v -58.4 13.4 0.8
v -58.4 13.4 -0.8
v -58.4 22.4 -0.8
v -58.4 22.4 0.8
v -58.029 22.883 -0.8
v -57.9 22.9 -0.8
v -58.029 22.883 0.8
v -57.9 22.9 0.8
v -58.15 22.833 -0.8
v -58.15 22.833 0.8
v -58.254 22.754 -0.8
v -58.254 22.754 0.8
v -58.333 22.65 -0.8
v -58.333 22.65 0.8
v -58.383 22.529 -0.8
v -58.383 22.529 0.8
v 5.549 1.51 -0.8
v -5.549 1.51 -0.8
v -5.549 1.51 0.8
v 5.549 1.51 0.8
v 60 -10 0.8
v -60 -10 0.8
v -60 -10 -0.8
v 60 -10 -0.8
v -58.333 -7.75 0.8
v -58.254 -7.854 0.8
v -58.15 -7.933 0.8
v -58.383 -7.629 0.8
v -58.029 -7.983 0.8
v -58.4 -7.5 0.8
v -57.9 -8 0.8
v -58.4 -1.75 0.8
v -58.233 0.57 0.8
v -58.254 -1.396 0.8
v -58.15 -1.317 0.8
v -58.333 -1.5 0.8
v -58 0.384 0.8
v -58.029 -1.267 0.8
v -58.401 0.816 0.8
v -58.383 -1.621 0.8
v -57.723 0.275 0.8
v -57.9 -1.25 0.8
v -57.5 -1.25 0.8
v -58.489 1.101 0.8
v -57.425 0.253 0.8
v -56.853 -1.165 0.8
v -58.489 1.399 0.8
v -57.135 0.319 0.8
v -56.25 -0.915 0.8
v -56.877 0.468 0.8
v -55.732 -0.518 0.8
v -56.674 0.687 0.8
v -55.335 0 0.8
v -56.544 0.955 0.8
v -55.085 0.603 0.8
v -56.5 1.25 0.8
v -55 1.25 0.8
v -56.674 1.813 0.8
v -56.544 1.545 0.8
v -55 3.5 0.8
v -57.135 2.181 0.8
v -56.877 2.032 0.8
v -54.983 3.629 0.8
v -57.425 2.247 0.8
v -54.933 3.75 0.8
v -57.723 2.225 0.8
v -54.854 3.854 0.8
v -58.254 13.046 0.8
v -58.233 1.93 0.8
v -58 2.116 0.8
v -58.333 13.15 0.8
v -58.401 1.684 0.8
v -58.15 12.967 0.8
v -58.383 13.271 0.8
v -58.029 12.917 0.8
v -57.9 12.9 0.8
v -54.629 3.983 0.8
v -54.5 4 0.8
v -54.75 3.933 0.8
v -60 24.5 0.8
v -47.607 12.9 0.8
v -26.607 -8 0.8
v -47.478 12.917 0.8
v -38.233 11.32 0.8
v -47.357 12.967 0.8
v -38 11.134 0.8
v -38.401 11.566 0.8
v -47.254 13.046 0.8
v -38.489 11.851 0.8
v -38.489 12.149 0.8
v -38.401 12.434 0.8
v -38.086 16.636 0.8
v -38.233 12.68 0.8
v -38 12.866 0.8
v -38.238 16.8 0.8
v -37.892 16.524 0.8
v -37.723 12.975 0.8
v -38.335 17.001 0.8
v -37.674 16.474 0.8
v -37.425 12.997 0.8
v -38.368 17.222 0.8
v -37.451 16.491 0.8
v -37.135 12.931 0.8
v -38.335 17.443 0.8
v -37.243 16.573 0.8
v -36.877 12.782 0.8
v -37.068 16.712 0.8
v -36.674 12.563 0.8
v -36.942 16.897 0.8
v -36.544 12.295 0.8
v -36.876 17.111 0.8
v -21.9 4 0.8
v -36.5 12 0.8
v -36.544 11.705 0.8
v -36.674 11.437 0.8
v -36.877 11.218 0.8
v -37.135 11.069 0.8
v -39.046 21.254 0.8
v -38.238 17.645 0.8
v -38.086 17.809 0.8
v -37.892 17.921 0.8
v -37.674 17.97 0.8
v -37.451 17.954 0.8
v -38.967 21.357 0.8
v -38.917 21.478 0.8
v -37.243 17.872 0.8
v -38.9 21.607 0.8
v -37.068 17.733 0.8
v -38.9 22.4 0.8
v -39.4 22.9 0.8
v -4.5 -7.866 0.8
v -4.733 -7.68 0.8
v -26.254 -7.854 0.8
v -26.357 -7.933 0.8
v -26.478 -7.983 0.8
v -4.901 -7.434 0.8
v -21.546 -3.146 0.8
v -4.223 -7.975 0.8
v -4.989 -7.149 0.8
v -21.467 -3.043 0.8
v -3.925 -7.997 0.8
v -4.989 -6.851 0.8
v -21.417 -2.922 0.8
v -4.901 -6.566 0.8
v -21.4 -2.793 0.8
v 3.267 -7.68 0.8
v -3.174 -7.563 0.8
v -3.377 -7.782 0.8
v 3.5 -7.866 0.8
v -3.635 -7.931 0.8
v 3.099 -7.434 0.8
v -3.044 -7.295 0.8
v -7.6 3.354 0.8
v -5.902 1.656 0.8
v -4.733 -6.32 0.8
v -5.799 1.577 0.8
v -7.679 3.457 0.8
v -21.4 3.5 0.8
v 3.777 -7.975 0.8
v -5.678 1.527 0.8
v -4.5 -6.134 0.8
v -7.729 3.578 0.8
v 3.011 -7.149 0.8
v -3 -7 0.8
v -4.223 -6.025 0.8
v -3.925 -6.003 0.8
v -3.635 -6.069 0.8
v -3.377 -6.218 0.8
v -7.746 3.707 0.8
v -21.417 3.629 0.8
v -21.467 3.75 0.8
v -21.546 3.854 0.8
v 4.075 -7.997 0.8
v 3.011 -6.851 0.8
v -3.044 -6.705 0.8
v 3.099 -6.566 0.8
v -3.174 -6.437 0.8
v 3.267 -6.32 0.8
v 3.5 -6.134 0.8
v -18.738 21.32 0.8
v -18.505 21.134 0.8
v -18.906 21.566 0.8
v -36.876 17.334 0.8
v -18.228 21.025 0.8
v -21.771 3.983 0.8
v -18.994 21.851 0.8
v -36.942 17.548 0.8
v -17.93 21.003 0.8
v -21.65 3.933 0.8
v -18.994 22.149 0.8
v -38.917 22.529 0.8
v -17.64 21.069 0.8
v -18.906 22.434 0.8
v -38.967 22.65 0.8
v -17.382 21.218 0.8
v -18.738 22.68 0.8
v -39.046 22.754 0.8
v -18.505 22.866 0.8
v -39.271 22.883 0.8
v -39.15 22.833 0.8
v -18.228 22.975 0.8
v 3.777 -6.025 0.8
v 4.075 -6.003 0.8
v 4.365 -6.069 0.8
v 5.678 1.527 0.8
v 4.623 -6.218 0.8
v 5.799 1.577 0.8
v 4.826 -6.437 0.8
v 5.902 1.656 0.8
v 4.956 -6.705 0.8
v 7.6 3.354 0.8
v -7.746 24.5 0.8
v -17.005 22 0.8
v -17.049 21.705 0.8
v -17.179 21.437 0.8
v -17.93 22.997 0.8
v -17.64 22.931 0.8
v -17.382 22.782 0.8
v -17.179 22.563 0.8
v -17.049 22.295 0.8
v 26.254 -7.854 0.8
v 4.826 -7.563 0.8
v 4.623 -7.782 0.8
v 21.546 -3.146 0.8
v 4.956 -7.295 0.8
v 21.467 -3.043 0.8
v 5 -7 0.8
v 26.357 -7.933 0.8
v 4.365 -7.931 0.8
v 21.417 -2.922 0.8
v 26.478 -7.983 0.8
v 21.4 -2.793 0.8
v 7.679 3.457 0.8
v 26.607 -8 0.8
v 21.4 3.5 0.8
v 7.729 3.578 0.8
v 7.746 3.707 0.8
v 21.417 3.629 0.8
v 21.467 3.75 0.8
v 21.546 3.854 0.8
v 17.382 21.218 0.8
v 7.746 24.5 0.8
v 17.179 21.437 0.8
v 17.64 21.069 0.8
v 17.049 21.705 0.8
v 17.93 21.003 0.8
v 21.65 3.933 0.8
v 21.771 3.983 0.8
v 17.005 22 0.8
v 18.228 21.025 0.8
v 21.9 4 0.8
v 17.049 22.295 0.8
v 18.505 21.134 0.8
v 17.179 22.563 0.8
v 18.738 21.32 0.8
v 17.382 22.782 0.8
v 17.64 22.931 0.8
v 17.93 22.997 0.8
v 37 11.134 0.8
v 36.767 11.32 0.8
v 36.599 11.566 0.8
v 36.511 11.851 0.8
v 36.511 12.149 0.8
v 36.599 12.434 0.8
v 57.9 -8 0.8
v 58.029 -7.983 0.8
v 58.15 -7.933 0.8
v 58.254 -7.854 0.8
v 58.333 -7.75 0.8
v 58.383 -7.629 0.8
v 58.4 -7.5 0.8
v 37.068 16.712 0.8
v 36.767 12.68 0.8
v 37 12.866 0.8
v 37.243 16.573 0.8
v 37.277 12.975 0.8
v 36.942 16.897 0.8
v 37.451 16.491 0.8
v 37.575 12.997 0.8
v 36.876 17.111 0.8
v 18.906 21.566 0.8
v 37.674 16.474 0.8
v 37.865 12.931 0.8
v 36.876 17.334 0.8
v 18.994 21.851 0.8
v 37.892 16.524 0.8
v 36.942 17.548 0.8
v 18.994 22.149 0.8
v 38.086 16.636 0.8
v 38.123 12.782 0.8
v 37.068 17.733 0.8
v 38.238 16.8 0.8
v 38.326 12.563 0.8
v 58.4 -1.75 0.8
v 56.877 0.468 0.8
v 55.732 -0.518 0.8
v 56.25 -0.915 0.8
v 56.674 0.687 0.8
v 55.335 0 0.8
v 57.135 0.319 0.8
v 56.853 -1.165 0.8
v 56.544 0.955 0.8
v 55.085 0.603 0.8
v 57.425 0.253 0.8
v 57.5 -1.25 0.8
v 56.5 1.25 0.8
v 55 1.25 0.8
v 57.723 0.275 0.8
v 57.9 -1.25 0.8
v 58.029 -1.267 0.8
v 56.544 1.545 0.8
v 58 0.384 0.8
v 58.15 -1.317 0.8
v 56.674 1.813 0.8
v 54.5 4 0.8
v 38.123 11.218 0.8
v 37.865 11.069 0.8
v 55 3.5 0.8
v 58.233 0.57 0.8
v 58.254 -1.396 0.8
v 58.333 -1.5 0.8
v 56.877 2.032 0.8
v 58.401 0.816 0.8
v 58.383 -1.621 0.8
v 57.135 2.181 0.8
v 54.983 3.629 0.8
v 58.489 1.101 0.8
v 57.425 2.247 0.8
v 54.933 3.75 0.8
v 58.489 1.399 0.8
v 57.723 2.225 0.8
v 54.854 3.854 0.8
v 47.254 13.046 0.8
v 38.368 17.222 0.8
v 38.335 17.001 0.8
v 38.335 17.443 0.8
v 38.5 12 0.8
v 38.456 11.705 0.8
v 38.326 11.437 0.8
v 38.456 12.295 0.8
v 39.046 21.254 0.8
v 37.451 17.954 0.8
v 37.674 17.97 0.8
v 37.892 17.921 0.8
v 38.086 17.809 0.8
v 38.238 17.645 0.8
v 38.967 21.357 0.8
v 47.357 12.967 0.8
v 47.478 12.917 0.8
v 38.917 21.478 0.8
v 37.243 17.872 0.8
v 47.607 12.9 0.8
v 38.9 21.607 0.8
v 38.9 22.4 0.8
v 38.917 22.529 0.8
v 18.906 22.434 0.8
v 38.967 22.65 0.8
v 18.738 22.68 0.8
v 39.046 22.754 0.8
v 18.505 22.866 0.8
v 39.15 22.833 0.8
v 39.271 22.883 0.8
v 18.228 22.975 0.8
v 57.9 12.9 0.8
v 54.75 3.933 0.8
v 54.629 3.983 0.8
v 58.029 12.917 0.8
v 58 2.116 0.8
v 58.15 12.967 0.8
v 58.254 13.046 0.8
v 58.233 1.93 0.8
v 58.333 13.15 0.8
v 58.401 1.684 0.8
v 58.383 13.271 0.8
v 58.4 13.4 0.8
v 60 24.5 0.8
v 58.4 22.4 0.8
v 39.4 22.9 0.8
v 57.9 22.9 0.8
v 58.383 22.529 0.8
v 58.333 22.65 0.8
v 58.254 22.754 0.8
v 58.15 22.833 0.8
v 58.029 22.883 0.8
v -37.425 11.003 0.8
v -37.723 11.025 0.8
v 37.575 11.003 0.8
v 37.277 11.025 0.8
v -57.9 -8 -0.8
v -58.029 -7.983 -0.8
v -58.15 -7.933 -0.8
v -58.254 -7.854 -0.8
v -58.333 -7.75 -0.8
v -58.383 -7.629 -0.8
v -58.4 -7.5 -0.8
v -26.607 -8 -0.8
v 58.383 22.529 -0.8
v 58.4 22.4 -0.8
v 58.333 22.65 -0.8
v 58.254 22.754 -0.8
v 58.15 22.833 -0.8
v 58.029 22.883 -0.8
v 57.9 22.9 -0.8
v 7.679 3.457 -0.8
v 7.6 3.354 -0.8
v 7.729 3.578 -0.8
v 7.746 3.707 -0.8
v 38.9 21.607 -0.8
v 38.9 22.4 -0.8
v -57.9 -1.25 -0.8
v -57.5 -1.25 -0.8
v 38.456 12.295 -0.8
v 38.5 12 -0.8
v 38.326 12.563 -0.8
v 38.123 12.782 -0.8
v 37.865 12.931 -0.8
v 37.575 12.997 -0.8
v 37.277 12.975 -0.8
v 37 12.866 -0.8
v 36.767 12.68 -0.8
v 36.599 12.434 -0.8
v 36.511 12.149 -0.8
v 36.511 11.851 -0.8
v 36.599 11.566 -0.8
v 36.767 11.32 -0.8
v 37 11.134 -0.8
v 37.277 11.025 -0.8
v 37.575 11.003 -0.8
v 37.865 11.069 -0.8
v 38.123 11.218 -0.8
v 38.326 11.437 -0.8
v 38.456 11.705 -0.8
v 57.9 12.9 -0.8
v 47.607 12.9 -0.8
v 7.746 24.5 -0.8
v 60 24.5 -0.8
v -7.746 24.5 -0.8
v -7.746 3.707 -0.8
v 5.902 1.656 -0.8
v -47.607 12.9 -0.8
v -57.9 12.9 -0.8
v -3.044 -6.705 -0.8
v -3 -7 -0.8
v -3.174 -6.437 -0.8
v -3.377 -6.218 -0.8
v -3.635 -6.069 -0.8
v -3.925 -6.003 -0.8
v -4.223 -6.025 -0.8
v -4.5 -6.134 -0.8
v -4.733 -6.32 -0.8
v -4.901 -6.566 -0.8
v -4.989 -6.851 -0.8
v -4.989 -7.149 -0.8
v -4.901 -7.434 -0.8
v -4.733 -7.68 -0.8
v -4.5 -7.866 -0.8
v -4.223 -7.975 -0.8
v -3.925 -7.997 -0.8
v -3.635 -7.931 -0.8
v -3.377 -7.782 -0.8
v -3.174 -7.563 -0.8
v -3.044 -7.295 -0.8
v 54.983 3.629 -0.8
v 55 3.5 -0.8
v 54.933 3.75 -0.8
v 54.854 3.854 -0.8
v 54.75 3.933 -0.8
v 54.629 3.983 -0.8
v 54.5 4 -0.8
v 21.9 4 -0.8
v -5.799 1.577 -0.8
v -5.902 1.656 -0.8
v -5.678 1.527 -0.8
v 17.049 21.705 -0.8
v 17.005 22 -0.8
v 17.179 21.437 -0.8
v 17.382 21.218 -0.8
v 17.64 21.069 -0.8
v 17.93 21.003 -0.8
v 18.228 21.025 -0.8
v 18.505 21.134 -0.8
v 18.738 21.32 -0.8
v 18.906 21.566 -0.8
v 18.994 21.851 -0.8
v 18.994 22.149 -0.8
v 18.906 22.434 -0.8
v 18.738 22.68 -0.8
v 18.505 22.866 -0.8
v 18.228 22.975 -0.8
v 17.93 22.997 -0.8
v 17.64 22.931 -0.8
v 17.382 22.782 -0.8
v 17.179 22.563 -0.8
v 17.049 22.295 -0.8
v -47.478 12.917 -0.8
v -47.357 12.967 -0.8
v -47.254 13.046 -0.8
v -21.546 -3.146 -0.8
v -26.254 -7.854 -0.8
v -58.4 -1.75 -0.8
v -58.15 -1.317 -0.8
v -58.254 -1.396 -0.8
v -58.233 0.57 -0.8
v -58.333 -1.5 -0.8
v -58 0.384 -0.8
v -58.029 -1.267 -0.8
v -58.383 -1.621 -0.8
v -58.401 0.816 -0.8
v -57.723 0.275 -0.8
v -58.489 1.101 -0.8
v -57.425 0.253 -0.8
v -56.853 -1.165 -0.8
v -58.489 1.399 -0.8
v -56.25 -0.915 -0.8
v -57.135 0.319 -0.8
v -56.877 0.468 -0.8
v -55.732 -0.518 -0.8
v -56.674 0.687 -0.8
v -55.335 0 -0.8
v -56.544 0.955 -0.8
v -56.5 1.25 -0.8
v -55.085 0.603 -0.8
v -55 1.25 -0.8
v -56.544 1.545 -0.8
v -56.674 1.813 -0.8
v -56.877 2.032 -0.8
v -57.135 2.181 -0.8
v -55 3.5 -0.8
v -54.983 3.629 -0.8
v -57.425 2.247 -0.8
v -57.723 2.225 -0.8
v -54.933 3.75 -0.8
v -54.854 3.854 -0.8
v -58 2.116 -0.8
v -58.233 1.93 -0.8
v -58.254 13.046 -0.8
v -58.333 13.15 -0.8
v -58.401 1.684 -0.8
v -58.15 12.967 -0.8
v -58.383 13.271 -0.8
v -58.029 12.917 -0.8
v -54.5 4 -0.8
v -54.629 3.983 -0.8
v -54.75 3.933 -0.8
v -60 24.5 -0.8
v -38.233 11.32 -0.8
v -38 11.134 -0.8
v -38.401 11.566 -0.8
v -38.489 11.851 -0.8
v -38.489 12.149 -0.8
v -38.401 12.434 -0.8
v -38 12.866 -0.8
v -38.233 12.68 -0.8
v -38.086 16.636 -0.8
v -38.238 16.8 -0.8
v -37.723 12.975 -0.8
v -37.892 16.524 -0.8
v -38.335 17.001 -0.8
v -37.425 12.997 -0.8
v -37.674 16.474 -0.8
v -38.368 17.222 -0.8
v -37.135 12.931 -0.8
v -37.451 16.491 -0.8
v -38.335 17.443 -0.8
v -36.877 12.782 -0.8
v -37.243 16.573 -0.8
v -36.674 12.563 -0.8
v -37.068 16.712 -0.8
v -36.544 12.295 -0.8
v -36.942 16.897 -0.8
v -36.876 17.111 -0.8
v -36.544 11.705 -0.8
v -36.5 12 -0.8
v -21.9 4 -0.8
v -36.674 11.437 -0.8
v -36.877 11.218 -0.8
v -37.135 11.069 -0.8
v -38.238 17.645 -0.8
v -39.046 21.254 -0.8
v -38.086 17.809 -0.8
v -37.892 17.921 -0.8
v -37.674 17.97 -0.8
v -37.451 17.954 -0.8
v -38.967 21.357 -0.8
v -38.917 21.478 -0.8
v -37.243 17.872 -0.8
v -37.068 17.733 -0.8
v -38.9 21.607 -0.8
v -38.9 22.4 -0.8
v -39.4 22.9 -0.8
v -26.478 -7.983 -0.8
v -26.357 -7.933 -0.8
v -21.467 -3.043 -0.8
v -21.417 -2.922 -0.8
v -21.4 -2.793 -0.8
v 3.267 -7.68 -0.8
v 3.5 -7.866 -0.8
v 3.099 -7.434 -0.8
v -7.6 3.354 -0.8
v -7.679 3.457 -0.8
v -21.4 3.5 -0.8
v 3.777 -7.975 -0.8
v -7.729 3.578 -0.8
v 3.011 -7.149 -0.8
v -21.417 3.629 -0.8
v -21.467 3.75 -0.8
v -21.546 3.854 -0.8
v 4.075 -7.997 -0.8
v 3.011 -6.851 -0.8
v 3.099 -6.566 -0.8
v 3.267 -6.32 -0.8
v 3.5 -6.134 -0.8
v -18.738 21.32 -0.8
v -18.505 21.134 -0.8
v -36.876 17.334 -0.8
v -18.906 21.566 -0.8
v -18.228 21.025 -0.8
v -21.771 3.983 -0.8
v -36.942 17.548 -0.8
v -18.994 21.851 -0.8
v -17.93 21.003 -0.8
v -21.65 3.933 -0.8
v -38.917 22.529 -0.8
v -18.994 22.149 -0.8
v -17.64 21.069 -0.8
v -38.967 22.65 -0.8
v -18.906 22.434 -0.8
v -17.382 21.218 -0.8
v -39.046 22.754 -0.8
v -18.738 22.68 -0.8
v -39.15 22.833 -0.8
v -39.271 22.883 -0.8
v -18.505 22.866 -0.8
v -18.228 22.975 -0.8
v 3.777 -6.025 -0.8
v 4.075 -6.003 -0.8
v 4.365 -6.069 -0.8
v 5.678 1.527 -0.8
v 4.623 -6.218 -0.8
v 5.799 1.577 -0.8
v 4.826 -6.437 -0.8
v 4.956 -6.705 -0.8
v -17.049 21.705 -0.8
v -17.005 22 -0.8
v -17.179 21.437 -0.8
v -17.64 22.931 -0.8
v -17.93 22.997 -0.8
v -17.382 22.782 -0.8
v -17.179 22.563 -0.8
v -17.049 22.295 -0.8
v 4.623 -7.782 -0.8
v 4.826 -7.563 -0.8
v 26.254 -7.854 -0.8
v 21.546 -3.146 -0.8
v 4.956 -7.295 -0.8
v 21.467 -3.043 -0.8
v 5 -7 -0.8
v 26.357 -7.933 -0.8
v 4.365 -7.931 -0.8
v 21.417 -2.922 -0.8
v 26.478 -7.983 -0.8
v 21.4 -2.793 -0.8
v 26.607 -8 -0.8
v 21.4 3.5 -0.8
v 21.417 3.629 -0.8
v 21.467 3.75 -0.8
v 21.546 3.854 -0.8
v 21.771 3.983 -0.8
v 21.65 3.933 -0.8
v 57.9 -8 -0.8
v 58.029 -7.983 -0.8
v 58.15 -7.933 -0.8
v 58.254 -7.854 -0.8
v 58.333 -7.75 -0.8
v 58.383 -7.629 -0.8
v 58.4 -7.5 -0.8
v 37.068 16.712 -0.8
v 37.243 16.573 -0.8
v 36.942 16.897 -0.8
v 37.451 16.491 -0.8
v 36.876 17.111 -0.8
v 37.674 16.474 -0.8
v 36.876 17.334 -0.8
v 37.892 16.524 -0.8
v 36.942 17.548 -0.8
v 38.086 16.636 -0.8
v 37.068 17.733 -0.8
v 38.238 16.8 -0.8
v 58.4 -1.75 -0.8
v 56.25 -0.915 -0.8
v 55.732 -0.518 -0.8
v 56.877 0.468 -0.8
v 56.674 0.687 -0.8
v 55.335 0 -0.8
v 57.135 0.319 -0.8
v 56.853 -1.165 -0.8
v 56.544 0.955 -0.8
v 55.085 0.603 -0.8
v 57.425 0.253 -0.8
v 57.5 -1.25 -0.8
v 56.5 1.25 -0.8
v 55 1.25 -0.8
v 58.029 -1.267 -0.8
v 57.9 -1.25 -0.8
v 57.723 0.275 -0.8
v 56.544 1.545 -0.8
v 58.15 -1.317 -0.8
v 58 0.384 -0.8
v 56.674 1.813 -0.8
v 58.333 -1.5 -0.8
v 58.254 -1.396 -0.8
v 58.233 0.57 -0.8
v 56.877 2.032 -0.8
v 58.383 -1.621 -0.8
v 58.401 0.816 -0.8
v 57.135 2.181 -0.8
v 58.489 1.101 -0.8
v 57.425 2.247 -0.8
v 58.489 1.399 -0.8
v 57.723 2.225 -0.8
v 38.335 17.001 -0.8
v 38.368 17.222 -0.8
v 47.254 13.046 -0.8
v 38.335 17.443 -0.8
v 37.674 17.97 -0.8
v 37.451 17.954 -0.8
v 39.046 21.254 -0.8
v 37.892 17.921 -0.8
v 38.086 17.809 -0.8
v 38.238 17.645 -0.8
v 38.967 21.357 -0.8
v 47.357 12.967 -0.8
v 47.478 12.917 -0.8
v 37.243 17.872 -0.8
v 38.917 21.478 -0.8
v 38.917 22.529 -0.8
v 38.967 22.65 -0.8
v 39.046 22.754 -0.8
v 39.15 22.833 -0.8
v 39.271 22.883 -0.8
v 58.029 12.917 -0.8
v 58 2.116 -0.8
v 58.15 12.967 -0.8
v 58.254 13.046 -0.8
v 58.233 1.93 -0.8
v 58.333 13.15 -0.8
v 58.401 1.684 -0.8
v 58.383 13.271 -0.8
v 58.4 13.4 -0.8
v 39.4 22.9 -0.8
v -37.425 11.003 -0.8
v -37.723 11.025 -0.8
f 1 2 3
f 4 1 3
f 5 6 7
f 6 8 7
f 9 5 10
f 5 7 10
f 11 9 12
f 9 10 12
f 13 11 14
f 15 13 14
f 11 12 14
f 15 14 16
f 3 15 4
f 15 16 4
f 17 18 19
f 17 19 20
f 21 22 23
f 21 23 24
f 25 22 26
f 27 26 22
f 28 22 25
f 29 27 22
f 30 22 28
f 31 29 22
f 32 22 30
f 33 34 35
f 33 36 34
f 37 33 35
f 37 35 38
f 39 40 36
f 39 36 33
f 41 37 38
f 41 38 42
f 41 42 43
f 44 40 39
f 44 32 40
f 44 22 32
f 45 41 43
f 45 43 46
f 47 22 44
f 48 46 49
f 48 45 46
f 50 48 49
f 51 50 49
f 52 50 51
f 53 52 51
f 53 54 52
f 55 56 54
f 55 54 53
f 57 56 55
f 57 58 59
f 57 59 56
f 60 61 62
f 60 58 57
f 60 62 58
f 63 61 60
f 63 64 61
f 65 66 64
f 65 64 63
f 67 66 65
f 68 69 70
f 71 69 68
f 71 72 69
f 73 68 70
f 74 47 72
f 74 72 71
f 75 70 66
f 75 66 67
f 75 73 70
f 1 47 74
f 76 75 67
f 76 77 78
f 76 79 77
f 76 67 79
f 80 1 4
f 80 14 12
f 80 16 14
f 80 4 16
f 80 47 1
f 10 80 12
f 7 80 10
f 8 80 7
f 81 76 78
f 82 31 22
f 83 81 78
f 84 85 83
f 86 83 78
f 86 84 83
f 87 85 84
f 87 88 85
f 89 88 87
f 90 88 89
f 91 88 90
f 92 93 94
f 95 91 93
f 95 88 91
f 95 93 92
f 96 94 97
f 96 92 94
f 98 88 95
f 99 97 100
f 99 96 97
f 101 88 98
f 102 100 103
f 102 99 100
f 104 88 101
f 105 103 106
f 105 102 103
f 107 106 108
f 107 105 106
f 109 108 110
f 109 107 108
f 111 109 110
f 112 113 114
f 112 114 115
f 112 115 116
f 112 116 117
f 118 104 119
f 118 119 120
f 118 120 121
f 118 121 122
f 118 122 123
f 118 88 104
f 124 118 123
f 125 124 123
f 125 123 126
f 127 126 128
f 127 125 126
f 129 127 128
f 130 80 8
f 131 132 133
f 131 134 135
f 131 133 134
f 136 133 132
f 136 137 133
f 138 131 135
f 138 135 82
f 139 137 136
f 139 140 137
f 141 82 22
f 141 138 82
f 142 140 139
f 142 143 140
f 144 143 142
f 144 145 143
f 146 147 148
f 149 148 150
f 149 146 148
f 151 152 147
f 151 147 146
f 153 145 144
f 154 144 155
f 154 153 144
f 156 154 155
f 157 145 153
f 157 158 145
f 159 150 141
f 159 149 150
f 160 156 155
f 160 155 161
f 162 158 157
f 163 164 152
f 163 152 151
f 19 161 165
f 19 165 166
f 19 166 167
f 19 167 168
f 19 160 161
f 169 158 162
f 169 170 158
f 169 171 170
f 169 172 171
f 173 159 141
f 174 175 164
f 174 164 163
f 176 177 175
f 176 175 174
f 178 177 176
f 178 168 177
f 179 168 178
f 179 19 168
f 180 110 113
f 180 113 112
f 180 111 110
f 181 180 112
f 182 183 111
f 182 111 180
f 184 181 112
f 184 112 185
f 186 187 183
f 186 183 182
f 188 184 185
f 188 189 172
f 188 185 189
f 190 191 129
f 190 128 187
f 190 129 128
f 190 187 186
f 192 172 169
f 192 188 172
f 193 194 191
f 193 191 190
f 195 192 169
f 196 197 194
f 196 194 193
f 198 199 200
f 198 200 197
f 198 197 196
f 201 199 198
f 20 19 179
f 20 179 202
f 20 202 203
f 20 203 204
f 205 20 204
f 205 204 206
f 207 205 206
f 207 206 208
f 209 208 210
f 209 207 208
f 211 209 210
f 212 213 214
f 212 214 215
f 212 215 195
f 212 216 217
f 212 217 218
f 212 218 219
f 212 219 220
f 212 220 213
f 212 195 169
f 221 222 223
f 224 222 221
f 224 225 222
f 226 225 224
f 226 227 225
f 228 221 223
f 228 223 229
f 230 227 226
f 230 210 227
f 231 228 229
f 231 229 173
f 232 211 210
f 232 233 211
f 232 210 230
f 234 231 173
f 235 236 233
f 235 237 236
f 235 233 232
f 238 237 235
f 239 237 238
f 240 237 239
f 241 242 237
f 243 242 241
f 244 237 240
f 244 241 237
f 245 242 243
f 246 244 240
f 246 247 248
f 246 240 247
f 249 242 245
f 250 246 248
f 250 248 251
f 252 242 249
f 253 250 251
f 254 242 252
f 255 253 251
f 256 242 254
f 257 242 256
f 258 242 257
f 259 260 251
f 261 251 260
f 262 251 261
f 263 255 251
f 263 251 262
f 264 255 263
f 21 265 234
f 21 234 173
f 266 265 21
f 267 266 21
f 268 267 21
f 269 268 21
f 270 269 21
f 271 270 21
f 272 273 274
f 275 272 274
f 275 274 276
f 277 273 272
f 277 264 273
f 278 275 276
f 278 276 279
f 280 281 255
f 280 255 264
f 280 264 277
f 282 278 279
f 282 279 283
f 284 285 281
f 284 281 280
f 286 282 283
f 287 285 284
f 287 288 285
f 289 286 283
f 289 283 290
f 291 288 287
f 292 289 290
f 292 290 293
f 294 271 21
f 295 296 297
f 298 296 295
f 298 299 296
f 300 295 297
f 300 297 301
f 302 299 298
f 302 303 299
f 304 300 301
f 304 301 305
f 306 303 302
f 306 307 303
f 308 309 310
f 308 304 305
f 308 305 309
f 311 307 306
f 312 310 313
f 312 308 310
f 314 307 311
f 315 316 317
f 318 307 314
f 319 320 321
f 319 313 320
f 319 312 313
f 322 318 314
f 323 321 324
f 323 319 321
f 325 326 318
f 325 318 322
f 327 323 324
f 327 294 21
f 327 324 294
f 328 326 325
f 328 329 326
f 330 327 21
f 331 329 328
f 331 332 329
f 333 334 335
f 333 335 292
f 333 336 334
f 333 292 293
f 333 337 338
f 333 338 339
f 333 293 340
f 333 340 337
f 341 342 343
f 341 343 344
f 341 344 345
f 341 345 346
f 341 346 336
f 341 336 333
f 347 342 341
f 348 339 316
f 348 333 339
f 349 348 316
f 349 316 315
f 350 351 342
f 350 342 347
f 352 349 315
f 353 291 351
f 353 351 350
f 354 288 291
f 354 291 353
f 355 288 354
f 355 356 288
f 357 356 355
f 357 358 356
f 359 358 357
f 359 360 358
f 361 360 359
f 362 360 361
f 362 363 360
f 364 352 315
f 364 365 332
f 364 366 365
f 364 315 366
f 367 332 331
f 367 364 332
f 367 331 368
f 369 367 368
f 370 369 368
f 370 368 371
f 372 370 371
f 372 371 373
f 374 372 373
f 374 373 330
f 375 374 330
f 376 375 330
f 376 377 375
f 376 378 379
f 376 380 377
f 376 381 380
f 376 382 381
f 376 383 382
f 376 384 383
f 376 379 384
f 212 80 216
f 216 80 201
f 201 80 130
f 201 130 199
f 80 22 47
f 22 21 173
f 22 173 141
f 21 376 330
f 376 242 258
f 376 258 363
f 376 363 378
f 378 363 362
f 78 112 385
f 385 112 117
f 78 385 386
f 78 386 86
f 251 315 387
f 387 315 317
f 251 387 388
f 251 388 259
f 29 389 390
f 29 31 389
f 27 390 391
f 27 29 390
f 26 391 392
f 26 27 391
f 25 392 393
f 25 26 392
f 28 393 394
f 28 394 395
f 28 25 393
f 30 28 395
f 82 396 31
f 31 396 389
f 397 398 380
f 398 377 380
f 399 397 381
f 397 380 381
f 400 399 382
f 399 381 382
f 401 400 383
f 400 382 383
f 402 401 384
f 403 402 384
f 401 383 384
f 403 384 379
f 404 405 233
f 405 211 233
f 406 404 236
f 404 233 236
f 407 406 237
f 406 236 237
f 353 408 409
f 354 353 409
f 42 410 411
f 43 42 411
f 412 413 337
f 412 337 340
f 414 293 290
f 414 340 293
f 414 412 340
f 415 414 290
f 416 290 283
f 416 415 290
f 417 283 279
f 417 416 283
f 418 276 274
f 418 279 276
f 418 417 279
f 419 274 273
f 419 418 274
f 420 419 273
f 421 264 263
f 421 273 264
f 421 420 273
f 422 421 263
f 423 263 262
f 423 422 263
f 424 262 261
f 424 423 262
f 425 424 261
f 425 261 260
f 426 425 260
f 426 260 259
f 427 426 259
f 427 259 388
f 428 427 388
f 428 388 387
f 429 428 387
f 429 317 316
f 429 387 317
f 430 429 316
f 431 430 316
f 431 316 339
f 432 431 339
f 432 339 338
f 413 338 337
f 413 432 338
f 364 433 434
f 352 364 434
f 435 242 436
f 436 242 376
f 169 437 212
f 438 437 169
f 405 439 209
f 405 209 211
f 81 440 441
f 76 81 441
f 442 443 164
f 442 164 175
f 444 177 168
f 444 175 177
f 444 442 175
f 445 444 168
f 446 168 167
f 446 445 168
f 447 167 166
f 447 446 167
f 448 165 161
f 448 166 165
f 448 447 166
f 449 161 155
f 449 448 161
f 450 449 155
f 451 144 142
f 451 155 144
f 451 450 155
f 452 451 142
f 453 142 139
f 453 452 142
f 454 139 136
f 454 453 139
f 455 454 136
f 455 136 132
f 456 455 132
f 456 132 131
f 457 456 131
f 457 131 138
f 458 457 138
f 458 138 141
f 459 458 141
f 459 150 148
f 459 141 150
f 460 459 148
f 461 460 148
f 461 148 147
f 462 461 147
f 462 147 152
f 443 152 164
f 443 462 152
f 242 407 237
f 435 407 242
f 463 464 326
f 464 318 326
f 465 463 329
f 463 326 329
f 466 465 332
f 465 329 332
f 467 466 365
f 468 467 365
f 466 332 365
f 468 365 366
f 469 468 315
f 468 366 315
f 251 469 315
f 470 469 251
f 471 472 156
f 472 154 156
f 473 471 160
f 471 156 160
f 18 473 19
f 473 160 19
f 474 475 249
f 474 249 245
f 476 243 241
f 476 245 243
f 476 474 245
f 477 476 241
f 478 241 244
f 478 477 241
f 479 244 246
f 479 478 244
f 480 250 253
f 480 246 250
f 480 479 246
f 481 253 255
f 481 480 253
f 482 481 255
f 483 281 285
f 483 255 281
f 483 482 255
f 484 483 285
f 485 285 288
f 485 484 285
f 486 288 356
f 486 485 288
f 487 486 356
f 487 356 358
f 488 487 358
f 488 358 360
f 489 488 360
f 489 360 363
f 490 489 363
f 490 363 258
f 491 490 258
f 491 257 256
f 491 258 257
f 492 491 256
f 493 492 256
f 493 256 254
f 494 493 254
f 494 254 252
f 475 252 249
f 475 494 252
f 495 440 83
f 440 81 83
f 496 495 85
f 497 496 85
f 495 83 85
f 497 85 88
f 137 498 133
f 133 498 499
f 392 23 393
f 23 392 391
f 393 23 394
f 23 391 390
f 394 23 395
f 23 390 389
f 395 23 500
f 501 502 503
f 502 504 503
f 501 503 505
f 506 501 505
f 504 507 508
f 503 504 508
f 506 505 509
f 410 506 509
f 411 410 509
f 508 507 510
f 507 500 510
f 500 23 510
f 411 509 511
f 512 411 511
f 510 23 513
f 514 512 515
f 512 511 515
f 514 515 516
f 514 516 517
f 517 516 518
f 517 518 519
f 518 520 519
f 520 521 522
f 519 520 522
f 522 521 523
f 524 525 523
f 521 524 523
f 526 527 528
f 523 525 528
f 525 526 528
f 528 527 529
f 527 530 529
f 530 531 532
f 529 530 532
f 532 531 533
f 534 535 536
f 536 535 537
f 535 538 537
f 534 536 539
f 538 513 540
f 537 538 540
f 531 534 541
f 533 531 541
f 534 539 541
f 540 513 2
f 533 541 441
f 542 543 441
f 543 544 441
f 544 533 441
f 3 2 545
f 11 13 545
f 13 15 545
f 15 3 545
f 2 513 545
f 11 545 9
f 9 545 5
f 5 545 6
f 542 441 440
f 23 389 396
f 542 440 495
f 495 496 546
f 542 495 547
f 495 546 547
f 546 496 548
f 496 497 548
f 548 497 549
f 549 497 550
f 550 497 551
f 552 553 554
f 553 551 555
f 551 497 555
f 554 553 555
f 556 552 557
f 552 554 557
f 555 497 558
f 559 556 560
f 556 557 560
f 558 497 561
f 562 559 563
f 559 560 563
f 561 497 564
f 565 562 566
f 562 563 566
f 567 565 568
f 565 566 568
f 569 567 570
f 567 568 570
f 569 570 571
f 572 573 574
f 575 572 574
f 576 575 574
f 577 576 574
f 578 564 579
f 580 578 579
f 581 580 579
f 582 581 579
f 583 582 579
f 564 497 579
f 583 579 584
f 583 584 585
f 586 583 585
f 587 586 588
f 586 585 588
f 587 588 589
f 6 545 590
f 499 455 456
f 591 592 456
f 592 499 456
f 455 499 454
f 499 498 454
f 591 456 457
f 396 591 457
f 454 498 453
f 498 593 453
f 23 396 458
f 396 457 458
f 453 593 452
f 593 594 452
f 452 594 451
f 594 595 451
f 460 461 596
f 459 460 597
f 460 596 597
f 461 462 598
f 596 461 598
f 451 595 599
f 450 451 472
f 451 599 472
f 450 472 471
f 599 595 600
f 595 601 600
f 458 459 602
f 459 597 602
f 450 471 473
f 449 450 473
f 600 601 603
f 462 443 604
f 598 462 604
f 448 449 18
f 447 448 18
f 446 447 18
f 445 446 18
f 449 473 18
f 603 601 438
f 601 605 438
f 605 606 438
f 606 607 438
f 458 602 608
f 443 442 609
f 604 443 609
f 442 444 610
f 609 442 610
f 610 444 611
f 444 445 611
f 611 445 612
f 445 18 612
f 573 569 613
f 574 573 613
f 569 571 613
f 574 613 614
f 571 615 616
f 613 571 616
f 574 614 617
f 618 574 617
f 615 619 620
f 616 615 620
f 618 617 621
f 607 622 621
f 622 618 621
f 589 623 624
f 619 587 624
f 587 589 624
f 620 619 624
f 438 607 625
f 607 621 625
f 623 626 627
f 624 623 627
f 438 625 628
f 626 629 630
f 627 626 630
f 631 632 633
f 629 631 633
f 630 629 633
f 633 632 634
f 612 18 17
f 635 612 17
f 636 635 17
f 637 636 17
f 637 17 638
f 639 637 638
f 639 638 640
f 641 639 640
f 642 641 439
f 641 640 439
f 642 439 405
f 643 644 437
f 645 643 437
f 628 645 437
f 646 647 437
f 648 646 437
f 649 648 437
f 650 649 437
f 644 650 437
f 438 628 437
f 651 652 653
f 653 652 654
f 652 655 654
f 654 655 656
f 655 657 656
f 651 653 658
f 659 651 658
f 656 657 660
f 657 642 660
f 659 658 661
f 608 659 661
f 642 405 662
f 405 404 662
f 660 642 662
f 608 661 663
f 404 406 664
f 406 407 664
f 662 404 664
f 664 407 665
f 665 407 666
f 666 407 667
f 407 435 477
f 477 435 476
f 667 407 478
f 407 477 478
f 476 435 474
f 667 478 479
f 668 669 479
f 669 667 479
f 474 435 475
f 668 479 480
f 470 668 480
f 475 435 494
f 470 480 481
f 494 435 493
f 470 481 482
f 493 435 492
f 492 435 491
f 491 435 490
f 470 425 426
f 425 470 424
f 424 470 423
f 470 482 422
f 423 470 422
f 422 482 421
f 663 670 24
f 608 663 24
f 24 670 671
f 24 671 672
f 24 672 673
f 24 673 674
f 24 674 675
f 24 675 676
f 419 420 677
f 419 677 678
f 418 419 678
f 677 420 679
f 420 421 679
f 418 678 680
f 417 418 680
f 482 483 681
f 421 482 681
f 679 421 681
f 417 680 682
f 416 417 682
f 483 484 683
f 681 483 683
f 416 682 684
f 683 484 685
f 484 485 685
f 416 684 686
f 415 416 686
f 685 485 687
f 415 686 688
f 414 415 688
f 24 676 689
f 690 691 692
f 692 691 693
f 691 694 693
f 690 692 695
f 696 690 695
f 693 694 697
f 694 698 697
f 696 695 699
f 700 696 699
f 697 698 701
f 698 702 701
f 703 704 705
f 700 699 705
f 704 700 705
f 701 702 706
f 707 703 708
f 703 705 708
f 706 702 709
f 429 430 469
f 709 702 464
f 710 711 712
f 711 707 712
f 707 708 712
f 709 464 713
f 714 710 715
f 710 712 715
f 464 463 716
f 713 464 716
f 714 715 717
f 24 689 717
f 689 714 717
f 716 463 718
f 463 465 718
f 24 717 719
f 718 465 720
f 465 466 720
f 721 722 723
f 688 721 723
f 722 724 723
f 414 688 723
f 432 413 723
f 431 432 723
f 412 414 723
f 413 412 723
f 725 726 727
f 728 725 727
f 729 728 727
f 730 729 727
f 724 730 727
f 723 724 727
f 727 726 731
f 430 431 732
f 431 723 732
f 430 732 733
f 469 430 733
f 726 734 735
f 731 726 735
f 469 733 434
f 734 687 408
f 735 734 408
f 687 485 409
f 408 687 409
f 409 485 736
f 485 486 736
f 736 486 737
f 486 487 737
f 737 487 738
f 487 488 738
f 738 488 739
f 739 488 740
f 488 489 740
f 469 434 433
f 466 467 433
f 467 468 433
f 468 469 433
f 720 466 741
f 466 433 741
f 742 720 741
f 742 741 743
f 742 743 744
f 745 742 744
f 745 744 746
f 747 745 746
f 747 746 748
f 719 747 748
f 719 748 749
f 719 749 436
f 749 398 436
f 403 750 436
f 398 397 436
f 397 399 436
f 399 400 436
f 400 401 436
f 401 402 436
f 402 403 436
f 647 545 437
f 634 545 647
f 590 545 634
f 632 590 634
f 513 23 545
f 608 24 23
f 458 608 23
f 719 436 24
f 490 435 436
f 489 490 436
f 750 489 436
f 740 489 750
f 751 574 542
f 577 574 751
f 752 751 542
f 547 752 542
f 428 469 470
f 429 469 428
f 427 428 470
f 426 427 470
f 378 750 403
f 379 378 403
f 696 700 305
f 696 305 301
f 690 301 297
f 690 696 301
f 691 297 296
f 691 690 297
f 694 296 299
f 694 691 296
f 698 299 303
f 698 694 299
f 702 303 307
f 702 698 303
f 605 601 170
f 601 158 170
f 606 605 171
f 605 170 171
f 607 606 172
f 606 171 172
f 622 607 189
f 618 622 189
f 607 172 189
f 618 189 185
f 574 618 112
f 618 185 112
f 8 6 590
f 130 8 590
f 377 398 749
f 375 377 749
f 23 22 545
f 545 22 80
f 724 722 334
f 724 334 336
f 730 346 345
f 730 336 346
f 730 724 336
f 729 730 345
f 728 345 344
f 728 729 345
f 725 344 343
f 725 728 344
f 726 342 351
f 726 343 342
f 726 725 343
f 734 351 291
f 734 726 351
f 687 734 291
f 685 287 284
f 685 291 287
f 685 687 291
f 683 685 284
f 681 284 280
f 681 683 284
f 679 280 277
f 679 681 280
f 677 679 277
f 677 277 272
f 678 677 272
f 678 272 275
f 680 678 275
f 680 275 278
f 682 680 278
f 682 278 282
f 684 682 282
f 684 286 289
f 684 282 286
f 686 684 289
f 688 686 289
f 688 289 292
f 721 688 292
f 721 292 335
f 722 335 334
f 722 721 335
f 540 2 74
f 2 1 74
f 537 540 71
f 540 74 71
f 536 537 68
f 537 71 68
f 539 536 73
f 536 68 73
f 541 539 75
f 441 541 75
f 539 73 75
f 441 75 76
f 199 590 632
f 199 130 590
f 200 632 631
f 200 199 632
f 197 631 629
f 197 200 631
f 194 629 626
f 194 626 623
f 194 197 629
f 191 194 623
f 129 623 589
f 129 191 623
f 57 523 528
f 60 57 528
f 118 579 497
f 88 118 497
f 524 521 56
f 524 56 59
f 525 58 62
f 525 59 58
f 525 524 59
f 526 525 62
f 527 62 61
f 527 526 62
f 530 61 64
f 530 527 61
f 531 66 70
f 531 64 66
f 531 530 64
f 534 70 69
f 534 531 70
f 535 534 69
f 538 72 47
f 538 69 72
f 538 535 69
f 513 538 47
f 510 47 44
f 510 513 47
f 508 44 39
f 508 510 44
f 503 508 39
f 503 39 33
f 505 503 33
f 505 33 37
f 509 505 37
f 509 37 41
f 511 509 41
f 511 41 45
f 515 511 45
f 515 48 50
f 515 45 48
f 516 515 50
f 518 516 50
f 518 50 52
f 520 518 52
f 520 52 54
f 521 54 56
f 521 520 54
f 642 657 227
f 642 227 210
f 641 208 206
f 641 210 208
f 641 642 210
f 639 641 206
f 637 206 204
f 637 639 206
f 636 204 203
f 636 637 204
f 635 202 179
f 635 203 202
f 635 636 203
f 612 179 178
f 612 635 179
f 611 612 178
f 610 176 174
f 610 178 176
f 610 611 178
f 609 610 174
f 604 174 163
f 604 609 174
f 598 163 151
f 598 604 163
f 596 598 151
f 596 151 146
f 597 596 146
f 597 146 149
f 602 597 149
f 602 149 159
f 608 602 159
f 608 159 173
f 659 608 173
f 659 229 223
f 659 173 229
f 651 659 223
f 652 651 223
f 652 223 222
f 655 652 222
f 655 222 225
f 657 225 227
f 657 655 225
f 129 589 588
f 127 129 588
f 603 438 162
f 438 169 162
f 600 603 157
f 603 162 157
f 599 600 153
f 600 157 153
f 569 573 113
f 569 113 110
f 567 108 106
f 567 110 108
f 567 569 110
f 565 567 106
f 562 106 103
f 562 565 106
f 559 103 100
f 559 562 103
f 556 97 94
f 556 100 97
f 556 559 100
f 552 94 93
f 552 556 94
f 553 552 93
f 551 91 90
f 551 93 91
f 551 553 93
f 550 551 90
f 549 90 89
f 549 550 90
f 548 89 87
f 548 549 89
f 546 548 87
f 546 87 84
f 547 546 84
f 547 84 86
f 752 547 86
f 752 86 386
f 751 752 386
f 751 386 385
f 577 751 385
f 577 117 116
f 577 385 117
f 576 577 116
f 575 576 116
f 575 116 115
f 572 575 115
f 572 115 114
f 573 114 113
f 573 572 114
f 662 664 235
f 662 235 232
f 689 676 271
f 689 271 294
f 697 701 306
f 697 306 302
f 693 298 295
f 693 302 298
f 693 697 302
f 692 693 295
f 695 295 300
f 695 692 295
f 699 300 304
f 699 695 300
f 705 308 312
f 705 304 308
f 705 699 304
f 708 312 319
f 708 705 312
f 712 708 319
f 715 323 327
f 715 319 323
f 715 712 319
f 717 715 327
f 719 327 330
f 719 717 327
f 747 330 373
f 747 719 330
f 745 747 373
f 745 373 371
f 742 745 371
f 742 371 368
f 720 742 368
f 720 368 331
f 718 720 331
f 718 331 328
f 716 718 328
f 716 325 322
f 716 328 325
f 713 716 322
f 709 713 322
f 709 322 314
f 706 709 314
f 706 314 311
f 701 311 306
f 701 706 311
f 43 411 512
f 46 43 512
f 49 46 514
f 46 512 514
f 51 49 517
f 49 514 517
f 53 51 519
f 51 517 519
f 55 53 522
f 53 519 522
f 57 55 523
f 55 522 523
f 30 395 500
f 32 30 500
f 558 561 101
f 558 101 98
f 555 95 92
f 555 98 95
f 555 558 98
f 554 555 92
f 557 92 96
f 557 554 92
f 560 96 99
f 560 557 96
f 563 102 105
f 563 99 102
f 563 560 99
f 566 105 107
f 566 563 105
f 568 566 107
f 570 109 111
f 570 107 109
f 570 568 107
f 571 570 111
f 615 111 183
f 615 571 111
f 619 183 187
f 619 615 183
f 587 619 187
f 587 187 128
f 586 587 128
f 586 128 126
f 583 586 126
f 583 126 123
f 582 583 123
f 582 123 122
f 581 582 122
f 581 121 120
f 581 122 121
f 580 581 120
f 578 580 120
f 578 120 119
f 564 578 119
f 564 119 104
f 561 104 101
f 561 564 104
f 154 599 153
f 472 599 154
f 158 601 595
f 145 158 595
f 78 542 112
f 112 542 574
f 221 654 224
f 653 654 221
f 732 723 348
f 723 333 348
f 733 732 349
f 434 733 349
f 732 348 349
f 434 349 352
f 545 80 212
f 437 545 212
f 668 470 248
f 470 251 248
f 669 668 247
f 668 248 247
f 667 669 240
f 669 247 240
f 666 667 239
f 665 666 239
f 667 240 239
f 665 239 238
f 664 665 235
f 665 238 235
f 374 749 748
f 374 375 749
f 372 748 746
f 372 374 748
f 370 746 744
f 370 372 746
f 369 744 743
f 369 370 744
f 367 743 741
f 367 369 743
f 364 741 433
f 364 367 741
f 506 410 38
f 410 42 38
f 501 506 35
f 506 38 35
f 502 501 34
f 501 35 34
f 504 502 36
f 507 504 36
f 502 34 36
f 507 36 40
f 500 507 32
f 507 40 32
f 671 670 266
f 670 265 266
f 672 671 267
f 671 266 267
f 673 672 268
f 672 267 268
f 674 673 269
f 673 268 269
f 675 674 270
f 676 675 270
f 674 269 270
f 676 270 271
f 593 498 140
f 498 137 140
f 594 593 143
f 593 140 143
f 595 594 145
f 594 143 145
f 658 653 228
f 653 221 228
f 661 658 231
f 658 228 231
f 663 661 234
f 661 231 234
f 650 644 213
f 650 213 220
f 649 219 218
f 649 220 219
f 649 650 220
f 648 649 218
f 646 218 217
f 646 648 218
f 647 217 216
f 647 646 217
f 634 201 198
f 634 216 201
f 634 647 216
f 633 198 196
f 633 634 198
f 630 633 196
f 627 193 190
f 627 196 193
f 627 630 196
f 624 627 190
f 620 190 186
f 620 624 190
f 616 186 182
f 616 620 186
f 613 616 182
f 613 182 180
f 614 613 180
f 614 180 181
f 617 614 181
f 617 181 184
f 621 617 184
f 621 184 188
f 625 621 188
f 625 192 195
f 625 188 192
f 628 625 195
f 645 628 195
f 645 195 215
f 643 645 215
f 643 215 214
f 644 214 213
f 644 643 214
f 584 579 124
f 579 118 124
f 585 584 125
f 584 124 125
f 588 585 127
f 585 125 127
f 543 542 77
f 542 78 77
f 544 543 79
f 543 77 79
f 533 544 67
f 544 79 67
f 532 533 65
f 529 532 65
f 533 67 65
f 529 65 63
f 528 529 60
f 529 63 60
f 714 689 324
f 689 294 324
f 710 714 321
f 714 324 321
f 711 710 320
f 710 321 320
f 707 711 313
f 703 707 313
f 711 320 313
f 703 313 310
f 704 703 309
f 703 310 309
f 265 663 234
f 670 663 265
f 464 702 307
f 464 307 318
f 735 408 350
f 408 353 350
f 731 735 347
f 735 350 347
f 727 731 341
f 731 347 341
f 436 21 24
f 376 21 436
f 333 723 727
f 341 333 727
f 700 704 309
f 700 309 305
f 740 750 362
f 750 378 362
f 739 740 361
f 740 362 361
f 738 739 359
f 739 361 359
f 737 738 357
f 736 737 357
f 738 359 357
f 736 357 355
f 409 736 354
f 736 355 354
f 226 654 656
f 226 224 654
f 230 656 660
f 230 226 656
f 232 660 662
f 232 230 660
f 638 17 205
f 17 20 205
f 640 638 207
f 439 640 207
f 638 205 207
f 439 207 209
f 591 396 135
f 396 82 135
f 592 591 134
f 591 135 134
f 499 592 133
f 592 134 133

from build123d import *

# Parameters (mm, degrees)
SKETCH1_W               = 120
SKETCH1_H               = 34.5
BOSS_EXTRUDE1_DEPTH     = 0.8
CUT_EXTRUDE1_DEPTH      = 65.82908298
CUT_EXTRUDE1_DEPTH_BACK = 65.82908298
SKETCH2_R               = 1
SKETCH2_R_2             = 0.75
FILLET1_R               = 0.5


with BuildPart() as part:
    # Sketch1 → Boss-Extrude1 (new, symmetric)
    with BuildSketch(Plane.XY):
        with Locations((0, 7.25)):
            Rectangle(SKETCH1_W, SKETCH1_H)
    extrude(amount=BOSS_EXTRUDE1_DEPTH, both=True)

    # Sketch2 → Cut-Extrude1 (cut, two sides: drawn at the far end of the back side and taken through both)
    with BuildSketch(Plane.XY.offset(0.8).offset(-CUT_EXTRUDE1_DEPTH_BACK)):
        with Locations((-37.5, 12)):
            Circle(SKETCH2_R)
        with Locations((-4, -7)):
            Circle(SKETCH2_R)
        with Locations((37.5, 12)):
            Circle(SKETCH2_R)
        with Locations((-57.5, 1.25)):
            Circle(SKETCH2_R)
        with Locations(Location((57.5, 1.25, 0), (0, 0, 180))):
            Circle(SKETCH2_R)
        with Locations((4, -7)):
            Circle(SKETCH2_R)
        with Locations((-18.005, 22)):
            Circle(SKETCH2_R)
        with Locations(Location((18.005, 22, 0), (0, 0, 180))):
            Circle(SKETCH2_R)
        with Locations((37.618090351, 17.2224)):
            Circle(SKETCH2_R_2)
        with Locations(Location((-37.618090351, 17.2224, 0), (0, 0, 180))):
            Circle(SKETCH2_R_2)
        with BuildLine():
            Line((-26.4, -8), (-58.4, -8))
            Line((-58.4, -8), (-58.4, -1.25))
            Line((-58.4, -1.25), (-57.5, -1.25))
            ThreePointArc((-57.5, -1.25), (-55.732233047, -0.517766953), (-55, 1.25))
            Line((-55, 1.25), (-55, 4))
            Line((-55, 4), (-26.4, 4))
            Line((-26.4, 4), (-21.4, 4))
            Line((-21.4, 4), (-21.4, -3))
            Line((-21.4, -3), (-26.4, -8))
        make_face()
        Polygon((-58.4, 22.9), (-38.9, 22.9), (-38.9, 21.4), (-47.4, 12.9), (-58.4, 12.9), align=None)
        Polygon((7.746, 24.5), (-7.746, 24.5), (-7.746, 3.5), (-5.756, 1.51), (5.756, 1.51), (7.746, 3.5), align=None)
        Polygon((58.4, 22.9), (58.4, 12.9), (47.4, 12.9), (38.9, 21.4), (38.9, 22.9), align=None)
        with BuildLine():
            Line((21.4, 4), (21.4, -3))
            Line((21.4, -3), (26.4, -8))
            Line((26.4, -8), (58.4, -8))
            Line((58.4, -8), (58.4, -1.25))
            Line((58.4, -1.25), (57.5, -1.25))
            ThreePointArc((57.5, -1.25), (55.732233047, -0.517766953), (55, 1.25))
            Line((55, 1.25), (55, 4))
            Line((55, 4), (26.4, 4))
            Line((26.4, 4), (21.4, 4))
        make_face()
    extrude(amount=CUT_EXTRUDE1_DEPTH + CUT_EXTRUDE1_DEPTH_BACK, mode=Mode.SUBTRACT)

    # Fillet1
    fillet1_edges = [part.edges().sort_by_distance(p)[0] for p in [
        (-7.746, 3.5, 0),
        (-5.756, 1.51, 0),
        (5.756, 1.51, 0),
        (7.746, 3.5, 0),
        (-26.4, -8, 0),
        (-58.4, -8, 0),
        (-21.4, -3, 0),
        (-21.4, 4, 0),
        (-55, 4, 0),
        (-58.4, -1.25, 0),
        (21.4, -3, 0),
        (26.4, -8, 0),
        (58.4, -8, 0),
        (58.4, -1.25, 0),
        (55, 4, 0),
        (21.4, 4, 0),
        (-58.4, 22.9, 0),
        (-38.9, 22.9, 0),
        (-58.4, 12.9, 0),
        (-47.4, 12.9, 0),
        (-38.9, 21.4, 0),
        (58.4, 22.9, 0),
        (58.4, 12.9, 0),
        (38.9, 22.9, 0),
        (38.9, 21.4, 0),
        (47.4, 12.9, 0),
    ]]
    fillet(fillet1_edges, radius=FILLET1_R)


solid = part.part
